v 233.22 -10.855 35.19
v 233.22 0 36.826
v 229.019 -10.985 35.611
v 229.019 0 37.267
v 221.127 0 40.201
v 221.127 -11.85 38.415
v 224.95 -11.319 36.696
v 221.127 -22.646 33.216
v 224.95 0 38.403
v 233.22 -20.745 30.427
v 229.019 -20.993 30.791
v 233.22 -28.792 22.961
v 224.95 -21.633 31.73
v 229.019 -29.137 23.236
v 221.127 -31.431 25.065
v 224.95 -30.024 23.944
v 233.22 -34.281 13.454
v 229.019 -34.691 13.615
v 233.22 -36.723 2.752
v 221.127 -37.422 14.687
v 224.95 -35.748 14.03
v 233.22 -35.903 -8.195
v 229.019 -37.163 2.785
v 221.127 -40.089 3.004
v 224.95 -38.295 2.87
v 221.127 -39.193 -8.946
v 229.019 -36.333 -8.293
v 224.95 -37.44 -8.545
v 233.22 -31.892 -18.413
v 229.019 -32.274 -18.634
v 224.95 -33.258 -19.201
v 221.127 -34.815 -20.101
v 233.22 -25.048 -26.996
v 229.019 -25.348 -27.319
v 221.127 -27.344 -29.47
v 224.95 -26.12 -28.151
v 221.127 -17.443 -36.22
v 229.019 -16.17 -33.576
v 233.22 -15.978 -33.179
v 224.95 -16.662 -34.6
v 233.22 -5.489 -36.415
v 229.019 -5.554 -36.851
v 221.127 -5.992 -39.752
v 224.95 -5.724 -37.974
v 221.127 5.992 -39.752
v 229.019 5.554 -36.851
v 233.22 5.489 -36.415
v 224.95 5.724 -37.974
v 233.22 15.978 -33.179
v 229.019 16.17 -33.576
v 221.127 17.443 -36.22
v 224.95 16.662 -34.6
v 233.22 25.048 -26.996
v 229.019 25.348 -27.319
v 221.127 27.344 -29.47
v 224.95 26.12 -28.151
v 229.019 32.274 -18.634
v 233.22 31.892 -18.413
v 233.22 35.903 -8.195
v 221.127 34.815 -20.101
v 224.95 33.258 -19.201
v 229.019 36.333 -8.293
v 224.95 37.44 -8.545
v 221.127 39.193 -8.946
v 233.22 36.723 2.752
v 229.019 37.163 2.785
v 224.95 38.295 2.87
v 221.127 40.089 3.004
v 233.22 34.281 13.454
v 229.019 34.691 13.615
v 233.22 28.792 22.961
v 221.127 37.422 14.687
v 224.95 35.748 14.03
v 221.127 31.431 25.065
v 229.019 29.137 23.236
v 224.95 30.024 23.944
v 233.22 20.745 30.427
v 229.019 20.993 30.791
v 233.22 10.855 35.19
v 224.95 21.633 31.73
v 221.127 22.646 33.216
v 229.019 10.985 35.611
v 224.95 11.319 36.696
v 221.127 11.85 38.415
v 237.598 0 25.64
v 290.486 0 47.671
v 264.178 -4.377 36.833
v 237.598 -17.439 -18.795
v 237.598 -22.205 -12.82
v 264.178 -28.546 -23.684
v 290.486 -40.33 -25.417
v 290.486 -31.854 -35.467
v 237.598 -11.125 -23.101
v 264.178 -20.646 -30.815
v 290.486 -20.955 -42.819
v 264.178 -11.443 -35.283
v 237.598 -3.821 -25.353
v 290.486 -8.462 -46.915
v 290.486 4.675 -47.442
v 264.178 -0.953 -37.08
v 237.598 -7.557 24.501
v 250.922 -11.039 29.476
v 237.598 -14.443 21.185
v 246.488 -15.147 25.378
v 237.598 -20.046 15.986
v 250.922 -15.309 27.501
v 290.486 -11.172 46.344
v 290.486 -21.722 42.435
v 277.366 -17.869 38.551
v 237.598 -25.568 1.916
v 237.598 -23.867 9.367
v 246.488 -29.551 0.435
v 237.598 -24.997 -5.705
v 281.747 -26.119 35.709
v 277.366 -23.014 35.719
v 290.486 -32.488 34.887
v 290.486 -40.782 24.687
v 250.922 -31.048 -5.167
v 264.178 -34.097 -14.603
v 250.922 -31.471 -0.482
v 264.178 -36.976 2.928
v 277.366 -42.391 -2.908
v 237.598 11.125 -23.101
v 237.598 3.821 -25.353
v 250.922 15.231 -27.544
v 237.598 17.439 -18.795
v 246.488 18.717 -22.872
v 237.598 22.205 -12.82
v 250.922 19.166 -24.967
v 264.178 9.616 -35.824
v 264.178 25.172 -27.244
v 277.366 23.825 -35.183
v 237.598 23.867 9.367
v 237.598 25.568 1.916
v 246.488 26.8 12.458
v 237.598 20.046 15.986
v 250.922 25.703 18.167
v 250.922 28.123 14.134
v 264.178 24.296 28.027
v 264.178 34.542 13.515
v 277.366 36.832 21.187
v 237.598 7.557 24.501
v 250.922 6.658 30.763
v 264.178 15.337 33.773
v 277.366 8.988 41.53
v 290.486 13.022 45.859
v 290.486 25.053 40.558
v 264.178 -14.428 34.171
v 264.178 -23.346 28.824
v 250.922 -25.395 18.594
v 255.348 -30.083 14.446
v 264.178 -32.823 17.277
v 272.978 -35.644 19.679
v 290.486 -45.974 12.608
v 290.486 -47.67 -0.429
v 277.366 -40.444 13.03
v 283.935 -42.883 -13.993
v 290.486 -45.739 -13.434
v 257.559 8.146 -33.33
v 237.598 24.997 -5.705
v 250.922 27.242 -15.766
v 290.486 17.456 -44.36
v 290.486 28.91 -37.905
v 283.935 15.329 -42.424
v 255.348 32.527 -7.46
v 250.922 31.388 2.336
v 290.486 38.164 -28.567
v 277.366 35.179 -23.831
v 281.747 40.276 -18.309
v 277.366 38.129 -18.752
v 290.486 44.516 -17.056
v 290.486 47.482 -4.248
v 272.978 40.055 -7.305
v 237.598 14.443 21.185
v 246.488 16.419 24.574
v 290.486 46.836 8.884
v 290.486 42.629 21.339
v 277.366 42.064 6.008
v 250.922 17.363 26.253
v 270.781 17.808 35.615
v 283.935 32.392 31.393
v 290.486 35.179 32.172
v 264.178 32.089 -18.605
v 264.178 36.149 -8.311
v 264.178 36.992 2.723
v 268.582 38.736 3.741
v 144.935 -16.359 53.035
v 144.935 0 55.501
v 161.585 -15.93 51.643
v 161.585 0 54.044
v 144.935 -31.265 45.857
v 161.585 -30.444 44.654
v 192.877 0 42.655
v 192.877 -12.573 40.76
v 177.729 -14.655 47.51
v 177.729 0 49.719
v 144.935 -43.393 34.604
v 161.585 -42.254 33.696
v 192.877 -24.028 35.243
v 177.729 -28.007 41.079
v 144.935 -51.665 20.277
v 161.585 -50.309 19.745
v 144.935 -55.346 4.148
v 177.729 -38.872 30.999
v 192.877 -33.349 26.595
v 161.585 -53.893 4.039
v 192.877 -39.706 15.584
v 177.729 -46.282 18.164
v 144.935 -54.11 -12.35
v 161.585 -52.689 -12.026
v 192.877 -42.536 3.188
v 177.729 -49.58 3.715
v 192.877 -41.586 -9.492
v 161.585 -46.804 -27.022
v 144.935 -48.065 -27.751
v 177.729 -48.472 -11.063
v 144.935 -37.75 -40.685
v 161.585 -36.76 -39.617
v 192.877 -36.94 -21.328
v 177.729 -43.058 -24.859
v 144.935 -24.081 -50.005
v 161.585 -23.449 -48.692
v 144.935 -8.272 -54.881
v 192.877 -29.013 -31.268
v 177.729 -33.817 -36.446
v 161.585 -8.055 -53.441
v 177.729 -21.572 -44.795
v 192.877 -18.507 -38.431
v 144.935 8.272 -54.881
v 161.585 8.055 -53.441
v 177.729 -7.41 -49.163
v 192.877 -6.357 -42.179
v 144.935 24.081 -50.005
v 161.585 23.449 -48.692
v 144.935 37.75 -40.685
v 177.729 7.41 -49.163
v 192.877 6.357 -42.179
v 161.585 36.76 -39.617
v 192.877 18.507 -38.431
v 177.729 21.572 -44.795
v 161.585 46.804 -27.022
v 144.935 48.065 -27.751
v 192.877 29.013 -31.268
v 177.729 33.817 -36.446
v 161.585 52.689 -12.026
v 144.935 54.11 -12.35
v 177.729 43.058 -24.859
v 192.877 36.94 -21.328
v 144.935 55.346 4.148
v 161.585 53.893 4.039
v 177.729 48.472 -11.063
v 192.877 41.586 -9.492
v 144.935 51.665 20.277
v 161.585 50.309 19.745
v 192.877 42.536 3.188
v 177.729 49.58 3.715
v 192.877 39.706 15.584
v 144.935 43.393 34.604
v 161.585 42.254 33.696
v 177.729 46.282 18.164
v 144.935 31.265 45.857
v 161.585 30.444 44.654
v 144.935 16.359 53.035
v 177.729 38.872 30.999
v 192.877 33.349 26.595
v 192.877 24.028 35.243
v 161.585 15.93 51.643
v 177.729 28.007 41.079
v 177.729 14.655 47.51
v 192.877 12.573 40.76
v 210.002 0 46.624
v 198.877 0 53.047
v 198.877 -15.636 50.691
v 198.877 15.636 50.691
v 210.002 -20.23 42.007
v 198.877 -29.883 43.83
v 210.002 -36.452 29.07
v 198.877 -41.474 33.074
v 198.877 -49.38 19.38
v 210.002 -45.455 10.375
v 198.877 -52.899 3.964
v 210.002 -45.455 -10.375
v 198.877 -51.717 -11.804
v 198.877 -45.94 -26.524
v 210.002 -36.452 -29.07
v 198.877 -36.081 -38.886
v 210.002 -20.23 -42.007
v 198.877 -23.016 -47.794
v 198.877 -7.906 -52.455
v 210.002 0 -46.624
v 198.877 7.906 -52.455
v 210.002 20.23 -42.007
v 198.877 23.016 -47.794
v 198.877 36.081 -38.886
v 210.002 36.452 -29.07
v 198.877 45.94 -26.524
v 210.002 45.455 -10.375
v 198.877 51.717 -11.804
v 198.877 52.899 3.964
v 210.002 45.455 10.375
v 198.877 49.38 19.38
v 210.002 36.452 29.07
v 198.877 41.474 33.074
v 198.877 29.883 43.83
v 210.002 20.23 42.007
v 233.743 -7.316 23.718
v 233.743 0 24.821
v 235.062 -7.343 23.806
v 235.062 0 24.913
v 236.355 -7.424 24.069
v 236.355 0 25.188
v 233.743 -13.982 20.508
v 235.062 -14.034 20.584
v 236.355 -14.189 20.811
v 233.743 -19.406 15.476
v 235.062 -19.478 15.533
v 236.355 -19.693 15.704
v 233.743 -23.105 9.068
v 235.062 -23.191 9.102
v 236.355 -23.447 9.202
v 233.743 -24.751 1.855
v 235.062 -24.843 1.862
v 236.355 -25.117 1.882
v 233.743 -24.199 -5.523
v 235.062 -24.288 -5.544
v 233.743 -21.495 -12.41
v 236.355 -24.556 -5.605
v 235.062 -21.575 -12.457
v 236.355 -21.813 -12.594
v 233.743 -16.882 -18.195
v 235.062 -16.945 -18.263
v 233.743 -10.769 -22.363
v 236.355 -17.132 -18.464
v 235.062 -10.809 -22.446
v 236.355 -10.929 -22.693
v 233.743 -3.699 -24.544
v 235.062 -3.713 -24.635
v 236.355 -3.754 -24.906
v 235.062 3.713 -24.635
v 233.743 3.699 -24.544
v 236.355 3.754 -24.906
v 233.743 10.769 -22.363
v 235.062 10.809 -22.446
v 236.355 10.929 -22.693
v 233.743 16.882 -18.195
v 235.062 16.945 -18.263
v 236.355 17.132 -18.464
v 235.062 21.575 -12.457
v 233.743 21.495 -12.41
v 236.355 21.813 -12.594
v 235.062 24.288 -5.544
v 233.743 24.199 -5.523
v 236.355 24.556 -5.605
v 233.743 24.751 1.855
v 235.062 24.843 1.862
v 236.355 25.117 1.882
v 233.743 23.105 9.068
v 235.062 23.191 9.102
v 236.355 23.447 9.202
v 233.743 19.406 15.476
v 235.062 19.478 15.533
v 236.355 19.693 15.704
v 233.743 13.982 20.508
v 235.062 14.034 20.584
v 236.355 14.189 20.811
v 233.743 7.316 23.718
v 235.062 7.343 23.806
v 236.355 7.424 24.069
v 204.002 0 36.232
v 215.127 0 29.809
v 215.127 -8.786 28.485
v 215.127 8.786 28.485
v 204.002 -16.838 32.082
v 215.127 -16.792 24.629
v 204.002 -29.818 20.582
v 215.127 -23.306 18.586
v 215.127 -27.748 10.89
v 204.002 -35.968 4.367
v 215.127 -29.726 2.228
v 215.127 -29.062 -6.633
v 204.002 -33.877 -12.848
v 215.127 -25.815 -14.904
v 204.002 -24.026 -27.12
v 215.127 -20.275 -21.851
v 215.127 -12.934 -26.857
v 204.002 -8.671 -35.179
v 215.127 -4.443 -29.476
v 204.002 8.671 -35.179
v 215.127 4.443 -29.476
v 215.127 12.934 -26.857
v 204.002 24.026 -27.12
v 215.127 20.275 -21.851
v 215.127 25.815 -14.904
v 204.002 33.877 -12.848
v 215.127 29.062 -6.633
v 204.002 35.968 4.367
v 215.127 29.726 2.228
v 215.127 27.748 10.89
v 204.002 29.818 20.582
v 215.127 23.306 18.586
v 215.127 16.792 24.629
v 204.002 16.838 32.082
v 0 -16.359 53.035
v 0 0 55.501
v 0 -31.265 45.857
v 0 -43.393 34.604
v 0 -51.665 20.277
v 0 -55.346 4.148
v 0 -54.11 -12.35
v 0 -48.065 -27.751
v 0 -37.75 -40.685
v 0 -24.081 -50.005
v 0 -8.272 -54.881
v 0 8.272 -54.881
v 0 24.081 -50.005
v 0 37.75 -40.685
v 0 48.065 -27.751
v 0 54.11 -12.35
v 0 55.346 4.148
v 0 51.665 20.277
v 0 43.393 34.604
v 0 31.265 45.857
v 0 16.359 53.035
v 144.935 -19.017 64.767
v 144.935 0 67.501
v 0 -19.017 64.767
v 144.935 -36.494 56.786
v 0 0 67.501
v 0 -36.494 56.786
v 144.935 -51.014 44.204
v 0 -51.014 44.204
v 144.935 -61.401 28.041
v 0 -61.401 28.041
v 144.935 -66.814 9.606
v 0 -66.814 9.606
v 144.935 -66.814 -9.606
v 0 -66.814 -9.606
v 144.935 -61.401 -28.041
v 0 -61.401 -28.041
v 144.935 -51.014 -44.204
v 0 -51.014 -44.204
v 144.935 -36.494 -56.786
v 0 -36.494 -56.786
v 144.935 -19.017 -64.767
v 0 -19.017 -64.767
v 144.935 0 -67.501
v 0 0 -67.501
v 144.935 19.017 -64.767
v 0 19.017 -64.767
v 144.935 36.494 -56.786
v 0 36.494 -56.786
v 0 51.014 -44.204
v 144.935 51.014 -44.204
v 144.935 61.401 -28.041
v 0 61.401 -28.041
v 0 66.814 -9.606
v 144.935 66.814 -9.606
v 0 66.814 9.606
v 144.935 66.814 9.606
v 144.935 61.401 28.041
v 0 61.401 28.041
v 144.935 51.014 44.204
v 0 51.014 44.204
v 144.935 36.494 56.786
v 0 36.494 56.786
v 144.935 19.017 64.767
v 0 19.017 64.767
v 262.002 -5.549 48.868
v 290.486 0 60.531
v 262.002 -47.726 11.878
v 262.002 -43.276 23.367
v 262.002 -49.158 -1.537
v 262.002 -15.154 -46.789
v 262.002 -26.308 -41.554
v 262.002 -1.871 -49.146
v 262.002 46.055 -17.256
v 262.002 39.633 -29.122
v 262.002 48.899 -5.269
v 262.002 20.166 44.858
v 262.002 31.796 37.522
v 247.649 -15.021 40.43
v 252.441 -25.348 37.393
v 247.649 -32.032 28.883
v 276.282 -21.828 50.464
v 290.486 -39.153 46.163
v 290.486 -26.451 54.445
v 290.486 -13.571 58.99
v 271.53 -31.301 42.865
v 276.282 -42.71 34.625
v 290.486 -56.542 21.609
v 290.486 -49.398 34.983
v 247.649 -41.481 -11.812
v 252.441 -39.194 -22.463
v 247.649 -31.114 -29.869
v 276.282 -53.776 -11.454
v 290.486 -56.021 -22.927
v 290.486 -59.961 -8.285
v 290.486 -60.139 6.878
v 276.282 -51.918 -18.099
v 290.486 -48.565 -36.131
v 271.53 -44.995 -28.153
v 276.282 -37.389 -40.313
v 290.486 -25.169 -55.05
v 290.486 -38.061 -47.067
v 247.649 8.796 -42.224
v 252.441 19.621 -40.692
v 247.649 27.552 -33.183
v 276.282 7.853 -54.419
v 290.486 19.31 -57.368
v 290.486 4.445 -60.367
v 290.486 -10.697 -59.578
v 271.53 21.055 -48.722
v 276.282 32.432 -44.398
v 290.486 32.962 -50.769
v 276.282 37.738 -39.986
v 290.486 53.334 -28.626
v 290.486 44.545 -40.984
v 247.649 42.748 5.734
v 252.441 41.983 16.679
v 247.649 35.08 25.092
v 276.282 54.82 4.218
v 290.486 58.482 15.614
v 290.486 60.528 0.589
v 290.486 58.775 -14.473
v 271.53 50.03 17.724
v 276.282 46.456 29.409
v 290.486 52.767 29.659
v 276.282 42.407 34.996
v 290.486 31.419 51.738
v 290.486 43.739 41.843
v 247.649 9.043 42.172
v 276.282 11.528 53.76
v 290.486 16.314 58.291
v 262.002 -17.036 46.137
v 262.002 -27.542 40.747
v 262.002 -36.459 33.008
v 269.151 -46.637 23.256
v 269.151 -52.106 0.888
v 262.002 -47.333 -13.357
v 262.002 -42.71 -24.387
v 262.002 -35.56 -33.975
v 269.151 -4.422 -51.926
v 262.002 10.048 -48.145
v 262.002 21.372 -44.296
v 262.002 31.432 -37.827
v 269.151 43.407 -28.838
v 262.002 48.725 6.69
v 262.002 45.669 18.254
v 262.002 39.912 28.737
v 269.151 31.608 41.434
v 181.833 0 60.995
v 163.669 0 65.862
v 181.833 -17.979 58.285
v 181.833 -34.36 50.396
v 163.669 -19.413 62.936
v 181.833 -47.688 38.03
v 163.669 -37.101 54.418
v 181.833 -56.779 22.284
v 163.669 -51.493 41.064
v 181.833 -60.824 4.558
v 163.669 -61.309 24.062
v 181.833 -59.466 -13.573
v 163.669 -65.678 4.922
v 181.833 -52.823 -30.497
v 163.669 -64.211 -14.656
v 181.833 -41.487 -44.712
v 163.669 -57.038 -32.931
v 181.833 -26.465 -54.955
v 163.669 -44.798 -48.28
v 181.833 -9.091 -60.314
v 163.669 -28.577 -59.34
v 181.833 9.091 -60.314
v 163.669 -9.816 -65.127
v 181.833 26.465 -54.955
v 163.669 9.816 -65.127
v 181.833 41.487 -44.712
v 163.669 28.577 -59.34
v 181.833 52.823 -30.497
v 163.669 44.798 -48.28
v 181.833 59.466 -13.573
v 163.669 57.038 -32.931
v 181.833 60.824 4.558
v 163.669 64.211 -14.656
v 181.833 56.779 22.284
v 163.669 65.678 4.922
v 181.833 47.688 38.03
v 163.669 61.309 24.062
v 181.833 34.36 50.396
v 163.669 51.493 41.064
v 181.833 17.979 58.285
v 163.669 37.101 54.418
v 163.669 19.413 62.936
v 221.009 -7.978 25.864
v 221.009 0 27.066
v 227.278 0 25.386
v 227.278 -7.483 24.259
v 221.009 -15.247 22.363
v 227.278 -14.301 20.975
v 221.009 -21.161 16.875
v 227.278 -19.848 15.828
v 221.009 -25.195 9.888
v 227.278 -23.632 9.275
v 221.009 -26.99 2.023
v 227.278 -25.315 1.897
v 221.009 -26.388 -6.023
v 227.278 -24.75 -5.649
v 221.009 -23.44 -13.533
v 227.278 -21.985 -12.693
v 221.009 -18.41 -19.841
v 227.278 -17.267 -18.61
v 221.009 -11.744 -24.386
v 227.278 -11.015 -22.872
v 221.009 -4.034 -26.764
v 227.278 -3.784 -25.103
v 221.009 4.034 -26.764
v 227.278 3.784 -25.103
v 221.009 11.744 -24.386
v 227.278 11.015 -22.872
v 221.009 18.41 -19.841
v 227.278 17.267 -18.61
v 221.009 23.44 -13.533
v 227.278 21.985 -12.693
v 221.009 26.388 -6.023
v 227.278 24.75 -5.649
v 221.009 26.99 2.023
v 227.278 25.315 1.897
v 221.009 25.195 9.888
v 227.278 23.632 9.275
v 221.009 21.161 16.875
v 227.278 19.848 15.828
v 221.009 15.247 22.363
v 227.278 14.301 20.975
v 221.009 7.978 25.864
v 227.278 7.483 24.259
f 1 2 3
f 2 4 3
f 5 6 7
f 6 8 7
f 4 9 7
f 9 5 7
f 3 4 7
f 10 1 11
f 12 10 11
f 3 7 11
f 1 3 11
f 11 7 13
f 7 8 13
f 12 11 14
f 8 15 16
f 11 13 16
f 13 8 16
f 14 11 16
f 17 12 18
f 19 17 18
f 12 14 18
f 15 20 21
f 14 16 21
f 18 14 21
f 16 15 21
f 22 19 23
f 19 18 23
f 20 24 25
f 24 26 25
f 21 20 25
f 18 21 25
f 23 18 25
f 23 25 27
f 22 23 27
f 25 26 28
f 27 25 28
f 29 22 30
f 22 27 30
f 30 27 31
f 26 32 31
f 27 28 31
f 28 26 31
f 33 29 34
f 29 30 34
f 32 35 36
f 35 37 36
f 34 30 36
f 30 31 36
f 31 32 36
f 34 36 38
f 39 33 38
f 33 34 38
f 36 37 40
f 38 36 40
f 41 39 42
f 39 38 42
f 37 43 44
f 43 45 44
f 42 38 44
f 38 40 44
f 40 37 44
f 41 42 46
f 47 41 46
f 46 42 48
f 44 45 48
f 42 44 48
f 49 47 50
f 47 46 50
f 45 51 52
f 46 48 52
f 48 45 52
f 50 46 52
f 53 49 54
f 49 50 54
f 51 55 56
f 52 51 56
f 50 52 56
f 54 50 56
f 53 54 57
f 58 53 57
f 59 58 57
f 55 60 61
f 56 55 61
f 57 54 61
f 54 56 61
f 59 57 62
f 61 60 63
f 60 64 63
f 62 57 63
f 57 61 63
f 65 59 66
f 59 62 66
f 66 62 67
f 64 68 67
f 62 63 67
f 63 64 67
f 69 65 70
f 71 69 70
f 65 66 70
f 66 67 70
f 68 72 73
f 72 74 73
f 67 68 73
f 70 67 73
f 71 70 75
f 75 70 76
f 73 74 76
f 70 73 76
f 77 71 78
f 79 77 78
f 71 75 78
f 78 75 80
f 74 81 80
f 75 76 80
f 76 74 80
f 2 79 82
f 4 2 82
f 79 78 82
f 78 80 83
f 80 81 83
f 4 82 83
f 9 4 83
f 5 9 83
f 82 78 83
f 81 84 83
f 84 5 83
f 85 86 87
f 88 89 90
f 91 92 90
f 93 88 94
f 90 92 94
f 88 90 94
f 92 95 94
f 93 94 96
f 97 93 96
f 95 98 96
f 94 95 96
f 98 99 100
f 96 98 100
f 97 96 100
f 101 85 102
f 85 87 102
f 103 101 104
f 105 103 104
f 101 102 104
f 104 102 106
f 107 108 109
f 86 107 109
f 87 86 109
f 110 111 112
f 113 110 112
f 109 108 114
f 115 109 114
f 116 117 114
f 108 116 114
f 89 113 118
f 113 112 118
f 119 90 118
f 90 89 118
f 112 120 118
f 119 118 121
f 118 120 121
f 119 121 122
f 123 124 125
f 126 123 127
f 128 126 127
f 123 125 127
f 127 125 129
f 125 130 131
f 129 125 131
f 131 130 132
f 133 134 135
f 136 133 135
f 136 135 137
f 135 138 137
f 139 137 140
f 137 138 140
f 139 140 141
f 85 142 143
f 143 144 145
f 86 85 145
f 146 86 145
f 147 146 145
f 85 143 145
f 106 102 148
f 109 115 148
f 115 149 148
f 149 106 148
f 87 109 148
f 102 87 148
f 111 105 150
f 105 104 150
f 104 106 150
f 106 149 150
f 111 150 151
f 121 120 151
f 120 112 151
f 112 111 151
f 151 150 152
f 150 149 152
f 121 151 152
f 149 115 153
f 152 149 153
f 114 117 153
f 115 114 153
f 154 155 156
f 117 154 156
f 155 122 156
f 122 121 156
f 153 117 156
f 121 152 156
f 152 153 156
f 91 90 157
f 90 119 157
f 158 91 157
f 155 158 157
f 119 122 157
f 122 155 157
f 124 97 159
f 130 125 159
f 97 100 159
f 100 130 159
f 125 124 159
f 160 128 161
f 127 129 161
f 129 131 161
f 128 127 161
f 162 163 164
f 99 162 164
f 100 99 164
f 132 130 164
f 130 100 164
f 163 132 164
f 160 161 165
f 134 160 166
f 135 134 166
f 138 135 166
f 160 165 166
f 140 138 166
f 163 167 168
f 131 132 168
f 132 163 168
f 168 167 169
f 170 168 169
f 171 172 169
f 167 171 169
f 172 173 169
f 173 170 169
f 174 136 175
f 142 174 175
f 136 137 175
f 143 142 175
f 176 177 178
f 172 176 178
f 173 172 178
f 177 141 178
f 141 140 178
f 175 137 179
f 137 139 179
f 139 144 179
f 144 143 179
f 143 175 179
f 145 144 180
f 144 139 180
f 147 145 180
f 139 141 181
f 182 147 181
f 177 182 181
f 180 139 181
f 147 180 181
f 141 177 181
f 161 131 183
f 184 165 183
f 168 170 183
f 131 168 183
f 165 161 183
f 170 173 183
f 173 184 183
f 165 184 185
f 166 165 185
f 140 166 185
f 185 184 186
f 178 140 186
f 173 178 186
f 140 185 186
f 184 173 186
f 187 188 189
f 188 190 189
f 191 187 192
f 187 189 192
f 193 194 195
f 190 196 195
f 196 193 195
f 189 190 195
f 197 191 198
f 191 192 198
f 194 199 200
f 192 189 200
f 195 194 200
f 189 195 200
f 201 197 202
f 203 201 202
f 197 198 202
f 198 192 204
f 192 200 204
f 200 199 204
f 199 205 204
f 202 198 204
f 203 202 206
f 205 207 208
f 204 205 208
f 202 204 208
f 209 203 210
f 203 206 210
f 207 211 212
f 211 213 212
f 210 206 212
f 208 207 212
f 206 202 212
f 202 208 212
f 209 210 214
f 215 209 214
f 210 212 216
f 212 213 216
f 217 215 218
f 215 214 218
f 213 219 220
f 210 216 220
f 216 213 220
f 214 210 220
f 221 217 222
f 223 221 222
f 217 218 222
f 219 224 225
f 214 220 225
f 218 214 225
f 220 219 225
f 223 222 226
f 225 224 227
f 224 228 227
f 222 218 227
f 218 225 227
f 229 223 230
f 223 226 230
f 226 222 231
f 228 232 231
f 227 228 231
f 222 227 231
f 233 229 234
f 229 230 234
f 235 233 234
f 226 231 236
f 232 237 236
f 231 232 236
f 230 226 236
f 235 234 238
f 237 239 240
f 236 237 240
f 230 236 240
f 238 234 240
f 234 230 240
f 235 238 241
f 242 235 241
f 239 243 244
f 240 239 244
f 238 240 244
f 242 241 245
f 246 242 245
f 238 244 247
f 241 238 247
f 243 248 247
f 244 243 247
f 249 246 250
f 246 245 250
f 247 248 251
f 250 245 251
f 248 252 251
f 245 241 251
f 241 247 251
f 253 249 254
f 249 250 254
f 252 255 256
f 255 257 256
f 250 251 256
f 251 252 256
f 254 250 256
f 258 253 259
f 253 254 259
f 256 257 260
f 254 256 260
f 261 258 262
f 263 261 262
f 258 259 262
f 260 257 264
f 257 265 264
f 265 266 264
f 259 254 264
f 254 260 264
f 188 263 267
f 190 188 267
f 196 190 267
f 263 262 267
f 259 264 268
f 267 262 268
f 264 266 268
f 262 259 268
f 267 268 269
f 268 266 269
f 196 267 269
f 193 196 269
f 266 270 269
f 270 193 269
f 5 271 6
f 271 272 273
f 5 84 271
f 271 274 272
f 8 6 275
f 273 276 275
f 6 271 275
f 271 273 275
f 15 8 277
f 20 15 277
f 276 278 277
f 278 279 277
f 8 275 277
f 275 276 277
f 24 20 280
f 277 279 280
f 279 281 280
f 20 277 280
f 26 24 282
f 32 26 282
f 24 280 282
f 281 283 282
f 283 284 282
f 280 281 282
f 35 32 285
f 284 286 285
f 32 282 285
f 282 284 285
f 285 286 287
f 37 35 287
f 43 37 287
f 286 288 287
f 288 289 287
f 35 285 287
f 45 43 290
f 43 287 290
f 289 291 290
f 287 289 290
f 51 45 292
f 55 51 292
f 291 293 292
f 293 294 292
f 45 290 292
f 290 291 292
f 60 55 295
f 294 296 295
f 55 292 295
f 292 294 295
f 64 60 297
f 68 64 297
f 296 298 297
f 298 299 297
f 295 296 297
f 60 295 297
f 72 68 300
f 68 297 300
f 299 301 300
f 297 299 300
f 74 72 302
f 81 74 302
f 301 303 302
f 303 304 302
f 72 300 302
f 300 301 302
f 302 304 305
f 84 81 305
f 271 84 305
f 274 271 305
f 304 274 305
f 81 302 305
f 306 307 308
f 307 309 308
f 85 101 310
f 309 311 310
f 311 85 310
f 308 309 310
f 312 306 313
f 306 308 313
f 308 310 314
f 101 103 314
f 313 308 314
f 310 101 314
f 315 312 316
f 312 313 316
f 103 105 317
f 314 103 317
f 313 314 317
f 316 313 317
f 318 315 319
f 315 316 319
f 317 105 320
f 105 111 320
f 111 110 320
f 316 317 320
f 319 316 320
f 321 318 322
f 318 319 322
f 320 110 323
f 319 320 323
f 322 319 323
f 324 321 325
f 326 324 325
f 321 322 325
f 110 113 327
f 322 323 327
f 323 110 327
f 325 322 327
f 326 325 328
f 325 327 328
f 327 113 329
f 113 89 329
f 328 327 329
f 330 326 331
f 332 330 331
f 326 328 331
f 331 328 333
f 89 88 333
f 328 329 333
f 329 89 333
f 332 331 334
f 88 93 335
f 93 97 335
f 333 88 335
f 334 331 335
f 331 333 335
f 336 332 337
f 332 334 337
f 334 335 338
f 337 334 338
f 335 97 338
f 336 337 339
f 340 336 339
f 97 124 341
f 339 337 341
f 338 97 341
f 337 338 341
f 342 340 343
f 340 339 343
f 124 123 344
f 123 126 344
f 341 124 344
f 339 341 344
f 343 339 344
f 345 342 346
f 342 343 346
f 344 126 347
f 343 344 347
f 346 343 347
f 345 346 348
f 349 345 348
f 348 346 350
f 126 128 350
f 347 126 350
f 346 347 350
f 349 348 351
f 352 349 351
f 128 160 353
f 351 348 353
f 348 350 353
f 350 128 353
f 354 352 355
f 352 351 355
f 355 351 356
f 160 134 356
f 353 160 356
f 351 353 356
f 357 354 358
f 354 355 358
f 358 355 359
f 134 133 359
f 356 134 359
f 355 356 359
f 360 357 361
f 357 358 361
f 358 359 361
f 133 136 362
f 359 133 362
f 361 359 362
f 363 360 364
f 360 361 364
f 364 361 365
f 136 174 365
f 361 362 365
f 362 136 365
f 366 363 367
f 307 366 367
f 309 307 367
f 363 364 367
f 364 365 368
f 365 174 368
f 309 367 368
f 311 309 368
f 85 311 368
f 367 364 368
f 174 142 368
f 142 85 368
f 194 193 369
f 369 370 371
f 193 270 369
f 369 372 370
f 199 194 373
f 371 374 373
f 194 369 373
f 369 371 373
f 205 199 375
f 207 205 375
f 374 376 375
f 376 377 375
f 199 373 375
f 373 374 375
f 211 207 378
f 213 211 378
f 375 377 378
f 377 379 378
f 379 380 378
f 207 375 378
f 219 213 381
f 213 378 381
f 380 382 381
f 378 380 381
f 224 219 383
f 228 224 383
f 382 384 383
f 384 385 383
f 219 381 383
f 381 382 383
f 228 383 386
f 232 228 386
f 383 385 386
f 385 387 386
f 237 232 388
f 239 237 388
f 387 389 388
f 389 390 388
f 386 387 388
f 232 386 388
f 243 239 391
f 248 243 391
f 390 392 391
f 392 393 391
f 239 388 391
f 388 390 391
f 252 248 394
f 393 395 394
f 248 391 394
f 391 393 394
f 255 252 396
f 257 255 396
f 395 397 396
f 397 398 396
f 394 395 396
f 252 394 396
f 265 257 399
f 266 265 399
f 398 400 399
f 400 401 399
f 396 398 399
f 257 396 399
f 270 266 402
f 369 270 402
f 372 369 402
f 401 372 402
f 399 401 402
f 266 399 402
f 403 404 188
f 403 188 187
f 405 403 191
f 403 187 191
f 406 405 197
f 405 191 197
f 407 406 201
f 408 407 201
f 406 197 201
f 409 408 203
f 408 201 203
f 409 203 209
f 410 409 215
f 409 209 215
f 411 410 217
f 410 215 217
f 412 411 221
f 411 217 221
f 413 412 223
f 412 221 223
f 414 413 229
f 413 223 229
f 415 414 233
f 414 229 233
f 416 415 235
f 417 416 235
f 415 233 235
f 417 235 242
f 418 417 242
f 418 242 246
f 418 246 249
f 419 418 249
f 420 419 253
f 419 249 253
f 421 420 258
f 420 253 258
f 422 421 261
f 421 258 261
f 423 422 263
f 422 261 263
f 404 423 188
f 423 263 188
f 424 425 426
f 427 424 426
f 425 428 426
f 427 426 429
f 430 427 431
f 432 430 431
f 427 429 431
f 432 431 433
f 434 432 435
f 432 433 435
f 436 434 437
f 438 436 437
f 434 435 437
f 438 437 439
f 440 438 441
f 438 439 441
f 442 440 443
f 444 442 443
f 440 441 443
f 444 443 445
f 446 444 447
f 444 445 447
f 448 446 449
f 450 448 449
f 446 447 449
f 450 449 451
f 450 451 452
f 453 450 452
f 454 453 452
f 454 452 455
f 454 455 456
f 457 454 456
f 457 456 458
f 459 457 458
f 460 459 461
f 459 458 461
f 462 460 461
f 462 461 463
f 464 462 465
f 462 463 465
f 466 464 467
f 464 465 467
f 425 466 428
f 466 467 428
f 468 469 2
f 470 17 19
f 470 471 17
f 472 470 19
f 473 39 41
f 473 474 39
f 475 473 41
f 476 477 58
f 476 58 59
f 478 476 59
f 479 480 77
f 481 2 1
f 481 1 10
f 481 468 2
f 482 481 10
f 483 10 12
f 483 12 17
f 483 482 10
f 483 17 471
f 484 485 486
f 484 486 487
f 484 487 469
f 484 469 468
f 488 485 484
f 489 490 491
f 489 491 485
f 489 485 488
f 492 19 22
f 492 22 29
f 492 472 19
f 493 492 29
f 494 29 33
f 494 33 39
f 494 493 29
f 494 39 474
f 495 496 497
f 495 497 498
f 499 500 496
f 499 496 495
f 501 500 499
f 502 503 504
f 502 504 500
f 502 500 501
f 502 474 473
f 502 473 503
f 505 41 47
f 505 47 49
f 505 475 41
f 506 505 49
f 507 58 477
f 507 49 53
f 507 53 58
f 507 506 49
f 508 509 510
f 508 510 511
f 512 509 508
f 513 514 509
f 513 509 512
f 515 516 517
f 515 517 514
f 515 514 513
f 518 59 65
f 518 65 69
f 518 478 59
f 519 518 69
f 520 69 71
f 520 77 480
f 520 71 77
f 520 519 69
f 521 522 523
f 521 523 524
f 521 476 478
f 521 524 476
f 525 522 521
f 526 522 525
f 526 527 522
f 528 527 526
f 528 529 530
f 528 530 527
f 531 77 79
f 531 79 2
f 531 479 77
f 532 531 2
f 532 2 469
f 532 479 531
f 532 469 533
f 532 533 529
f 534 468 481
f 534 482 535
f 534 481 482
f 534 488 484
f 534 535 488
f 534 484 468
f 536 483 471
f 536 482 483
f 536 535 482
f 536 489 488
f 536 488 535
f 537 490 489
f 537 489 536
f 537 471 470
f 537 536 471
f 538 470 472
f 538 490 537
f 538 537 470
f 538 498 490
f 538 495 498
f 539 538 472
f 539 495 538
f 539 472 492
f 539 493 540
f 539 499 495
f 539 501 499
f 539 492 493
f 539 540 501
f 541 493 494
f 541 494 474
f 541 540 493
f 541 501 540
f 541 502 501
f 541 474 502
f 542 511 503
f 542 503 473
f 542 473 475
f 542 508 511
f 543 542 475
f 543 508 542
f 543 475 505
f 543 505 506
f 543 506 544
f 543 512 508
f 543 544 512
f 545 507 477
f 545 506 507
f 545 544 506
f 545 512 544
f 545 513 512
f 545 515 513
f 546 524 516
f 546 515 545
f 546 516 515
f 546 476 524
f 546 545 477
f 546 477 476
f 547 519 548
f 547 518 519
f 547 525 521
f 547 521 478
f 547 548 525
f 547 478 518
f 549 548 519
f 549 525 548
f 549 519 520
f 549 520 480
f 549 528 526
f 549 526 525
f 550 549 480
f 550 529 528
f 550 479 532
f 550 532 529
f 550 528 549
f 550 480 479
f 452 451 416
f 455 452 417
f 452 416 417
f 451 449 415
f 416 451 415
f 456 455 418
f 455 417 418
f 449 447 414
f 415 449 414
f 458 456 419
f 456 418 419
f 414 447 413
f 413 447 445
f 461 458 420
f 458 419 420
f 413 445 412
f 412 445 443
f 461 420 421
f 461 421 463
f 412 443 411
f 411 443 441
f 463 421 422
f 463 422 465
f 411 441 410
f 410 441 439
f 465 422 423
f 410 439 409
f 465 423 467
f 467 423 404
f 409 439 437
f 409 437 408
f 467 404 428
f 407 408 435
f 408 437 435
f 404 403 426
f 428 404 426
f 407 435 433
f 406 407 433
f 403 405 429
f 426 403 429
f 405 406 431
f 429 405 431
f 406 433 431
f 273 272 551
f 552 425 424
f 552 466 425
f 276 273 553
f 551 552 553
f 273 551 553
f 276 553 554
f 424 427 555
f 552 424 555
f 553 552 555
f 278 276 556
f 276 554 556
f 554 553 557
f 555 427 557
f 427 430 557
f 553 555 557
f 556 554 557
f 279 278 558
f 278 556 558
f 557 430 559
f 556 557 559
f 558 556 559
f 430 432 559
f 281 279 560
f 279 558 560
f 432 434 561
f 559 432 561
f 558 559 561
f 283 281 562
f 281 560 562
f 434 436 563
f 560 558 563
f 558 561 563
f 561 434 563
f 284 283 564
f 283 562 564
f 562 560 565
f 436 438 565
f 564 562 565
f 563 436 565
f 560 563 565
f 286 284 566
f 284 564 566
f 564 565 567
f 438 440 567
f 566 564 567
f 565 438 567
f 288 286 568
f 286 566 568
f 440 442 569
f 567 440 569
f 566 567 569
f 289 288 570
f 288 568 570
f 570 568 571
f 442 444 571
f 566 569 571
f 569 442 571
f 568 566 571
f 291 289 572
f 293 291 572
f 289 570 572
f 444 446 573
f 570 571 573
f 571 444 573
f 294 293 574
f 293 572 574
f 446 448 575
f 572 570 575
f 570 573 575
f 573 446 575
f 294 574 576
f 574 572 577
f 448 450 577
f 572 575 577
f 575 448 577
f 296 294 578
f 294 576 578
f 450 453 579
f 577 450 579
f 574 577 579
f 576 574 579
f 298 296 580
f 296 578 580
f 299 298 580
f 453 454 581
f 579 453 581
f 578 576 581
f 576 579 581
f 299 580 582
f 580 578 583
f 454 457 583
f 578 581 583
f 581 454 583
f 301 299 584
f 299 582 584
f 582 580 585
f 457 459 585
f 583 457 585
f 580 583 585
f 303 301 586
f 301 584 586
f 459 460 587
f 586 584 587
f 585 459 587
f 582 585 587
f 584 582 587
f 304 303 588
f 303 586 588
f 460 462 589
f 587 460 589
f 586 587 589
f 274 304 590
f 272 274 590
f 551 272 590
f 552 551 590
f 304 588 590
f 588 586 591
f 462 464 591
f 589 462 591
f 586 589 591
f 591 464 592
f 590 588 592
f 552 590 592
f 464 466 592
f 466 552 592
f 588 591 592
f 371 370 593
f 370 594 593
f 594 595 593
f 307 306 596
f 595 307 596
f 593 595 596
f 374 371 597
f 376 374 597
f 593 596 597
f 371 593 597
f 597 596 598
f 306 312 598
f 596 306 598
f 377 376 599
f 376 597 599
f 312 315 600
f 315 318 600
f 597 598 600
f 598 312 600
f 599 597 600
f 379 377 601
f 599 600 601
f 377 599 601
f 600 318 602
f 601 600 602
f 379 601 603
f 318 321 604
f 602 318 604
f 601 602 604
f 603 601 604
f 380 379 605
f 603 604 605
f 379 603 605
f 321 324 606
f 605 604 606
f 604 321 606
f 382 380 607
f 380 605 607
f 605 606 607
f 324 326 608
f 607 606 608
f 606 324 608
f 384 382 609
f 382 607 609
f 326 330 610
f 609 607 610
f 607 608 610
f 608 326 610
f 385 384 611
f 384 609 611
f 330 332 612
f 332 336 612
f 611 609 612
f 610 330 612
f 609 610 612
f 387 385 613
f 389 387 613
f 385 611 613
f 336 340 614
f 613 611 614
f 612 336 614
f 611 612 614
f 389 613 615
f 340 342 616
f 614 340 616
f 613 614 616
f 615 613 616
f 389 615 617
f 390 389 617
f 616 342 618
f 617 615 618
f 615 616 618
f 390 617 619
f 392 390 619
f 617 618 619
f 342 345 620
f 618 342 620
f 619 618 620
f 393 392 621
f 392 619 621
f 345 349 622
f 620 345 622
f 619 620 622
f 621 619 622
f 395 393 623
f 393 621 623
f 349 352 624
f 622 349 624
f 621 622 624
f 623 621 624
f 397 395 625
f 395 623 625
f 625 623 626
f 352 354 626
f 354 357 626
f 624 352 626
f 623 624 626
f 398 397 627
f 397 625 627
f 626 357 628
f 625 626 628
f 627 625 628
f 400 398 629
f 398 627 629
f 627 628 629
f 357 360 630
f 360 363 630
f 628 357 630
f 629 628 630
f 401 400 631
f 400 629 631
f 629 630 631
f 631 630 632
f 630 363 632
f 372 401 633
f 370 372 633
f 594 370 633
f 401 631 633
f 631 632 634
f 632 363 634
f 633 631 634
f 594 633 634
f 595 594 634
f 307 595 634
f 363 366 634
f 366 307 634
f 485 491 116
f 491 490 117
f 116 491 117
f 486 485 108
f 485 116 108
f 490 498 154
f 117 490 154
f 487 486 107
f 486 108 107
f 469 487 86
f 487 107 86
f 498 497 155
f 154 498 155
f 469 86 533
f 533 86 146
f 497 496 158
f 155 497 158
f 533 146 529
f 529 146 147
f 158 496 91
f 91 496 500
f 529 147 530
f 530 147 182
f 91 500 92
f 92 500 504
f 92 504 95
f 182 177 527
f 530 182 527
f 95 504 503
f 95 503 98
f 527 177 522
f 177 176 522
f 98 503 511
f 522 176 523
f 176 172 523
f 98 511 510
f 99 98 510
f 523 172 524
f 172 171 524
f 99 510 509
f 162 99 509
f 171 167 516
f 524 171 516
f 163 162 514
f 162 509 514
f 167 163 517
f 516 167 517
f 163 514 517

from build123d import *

# Parameters (mm, degrees)
CUT_EXTRUDE1_DEPTH      = 391.541482324
CUT_EXTRUDE1_DEPTH_BACK = 391.541482324
SKETCH6_W               = 140
SKETCH6_H               = 298.689117204


with BuildPart() as part:
    # Sketch1 → Revolve1 (revolve)
    with BuildSketch(Plane.XY, mode=Mode.PRIVATE) as revolve1_sk:
        with BuildLine():
            Line((192.877031349, 42.655012217), (215.127149697, 29.808876046))
            ThreePointArc((215.127149697, 29.808876046), (224.106622413, 26.089455548), (233.742783423, 24.820826336))
            ThreePointArc((233.742783423, 24.820826336), (235.713203517, 25.027826984), (237.597587303, 25.639792966))
            add(Edge.make_bspline(
                [(237.597587303, 25.639792966), (305.794911856, 55.987196879), (370.436287167, 74.957098261)],
                knots=[0, 0, 0, 1, 1, 1], degree=2))
            Line((370.436287167, 74.957098261), (370.436287167, 87.463153647))
            Line((370.436287167, 87.463153647), (367.057221516, 86.471520319))
            add(Edge.make_bspline(
                [(233.22019623, 36.826239285), (236.069082049, 38.09248657), (241.789514517, 40.609481325), (253.162518773, 45.510982188), (267.324585603, 51.421835133), (284.209562024, 58.15884205), (300.991410001, 64.542388321), (317.668219236, 70.571409981), (334.241993713, 76.246293785), (347.963085648, 80.678672393), (358.895885037, 84.049397838), (364.330437681, 85.671308068), (367.057221516, 86.471520319)],
                knots=[0.492865274, 0.492865274, 0.492865274, 0.492865274, 0.492972774, 0.493080274, 0.493295274, 0.493510274, 0.493725274, 0.493940275, 0.494155275, 0.494370275, 0.494477775, 0.494585275, 0.494585275, 0.494585275, 0.494585275], degree=3))
            ThreePointArc((233.22019623, 36.826239285), (226.960399594, 37.749503395), (221.127153585, 40.201178647))
            Line((221.127153585, 40.201178647), (198.877039879, 53.047312137))
            ThreePointArc((198.877039879, 53.047312137), (172.857293904, 63.825067551), (144.9346606, 67.5011717))
            Line((144.9346606, 67.5011717), (0, 67.5011717))
            Line((0, 67.5011717), (0, 55.5011717))
            Line((0, 55.5011717), (144.9346606, 55.5011717))
            ThreePointArc((144.9346606, 55.5011717), (169.751460606, 52.23395891), (192.877031349, 42.655012217))
        make_face()
    revolve(revolve1_sk.sketch.rotate(Axis((0, 0, 0), (1, 0, 0)), 90), axis=Axis((0, 0, 0), (1, 0, 0)))

    # Sketch6 → Cut-Extrude1 (cut, two sides: drawn at the far end of the back side and taken through both)
    with BuildSketch(Plane.XY.offset(-CUT_EXTRUDE1_DEPTH_BACK)):
        with Locations((360.486, 0)):
            Rectangle(SKETCH6_W, SKETCH6_H)
    extrude(amount=CUT_EXTRUDE1_DEPTH + CUT_EXTRUDE1_DEPTH_BACK, mode=Mode.SUBTRACT)


solid = part.part
